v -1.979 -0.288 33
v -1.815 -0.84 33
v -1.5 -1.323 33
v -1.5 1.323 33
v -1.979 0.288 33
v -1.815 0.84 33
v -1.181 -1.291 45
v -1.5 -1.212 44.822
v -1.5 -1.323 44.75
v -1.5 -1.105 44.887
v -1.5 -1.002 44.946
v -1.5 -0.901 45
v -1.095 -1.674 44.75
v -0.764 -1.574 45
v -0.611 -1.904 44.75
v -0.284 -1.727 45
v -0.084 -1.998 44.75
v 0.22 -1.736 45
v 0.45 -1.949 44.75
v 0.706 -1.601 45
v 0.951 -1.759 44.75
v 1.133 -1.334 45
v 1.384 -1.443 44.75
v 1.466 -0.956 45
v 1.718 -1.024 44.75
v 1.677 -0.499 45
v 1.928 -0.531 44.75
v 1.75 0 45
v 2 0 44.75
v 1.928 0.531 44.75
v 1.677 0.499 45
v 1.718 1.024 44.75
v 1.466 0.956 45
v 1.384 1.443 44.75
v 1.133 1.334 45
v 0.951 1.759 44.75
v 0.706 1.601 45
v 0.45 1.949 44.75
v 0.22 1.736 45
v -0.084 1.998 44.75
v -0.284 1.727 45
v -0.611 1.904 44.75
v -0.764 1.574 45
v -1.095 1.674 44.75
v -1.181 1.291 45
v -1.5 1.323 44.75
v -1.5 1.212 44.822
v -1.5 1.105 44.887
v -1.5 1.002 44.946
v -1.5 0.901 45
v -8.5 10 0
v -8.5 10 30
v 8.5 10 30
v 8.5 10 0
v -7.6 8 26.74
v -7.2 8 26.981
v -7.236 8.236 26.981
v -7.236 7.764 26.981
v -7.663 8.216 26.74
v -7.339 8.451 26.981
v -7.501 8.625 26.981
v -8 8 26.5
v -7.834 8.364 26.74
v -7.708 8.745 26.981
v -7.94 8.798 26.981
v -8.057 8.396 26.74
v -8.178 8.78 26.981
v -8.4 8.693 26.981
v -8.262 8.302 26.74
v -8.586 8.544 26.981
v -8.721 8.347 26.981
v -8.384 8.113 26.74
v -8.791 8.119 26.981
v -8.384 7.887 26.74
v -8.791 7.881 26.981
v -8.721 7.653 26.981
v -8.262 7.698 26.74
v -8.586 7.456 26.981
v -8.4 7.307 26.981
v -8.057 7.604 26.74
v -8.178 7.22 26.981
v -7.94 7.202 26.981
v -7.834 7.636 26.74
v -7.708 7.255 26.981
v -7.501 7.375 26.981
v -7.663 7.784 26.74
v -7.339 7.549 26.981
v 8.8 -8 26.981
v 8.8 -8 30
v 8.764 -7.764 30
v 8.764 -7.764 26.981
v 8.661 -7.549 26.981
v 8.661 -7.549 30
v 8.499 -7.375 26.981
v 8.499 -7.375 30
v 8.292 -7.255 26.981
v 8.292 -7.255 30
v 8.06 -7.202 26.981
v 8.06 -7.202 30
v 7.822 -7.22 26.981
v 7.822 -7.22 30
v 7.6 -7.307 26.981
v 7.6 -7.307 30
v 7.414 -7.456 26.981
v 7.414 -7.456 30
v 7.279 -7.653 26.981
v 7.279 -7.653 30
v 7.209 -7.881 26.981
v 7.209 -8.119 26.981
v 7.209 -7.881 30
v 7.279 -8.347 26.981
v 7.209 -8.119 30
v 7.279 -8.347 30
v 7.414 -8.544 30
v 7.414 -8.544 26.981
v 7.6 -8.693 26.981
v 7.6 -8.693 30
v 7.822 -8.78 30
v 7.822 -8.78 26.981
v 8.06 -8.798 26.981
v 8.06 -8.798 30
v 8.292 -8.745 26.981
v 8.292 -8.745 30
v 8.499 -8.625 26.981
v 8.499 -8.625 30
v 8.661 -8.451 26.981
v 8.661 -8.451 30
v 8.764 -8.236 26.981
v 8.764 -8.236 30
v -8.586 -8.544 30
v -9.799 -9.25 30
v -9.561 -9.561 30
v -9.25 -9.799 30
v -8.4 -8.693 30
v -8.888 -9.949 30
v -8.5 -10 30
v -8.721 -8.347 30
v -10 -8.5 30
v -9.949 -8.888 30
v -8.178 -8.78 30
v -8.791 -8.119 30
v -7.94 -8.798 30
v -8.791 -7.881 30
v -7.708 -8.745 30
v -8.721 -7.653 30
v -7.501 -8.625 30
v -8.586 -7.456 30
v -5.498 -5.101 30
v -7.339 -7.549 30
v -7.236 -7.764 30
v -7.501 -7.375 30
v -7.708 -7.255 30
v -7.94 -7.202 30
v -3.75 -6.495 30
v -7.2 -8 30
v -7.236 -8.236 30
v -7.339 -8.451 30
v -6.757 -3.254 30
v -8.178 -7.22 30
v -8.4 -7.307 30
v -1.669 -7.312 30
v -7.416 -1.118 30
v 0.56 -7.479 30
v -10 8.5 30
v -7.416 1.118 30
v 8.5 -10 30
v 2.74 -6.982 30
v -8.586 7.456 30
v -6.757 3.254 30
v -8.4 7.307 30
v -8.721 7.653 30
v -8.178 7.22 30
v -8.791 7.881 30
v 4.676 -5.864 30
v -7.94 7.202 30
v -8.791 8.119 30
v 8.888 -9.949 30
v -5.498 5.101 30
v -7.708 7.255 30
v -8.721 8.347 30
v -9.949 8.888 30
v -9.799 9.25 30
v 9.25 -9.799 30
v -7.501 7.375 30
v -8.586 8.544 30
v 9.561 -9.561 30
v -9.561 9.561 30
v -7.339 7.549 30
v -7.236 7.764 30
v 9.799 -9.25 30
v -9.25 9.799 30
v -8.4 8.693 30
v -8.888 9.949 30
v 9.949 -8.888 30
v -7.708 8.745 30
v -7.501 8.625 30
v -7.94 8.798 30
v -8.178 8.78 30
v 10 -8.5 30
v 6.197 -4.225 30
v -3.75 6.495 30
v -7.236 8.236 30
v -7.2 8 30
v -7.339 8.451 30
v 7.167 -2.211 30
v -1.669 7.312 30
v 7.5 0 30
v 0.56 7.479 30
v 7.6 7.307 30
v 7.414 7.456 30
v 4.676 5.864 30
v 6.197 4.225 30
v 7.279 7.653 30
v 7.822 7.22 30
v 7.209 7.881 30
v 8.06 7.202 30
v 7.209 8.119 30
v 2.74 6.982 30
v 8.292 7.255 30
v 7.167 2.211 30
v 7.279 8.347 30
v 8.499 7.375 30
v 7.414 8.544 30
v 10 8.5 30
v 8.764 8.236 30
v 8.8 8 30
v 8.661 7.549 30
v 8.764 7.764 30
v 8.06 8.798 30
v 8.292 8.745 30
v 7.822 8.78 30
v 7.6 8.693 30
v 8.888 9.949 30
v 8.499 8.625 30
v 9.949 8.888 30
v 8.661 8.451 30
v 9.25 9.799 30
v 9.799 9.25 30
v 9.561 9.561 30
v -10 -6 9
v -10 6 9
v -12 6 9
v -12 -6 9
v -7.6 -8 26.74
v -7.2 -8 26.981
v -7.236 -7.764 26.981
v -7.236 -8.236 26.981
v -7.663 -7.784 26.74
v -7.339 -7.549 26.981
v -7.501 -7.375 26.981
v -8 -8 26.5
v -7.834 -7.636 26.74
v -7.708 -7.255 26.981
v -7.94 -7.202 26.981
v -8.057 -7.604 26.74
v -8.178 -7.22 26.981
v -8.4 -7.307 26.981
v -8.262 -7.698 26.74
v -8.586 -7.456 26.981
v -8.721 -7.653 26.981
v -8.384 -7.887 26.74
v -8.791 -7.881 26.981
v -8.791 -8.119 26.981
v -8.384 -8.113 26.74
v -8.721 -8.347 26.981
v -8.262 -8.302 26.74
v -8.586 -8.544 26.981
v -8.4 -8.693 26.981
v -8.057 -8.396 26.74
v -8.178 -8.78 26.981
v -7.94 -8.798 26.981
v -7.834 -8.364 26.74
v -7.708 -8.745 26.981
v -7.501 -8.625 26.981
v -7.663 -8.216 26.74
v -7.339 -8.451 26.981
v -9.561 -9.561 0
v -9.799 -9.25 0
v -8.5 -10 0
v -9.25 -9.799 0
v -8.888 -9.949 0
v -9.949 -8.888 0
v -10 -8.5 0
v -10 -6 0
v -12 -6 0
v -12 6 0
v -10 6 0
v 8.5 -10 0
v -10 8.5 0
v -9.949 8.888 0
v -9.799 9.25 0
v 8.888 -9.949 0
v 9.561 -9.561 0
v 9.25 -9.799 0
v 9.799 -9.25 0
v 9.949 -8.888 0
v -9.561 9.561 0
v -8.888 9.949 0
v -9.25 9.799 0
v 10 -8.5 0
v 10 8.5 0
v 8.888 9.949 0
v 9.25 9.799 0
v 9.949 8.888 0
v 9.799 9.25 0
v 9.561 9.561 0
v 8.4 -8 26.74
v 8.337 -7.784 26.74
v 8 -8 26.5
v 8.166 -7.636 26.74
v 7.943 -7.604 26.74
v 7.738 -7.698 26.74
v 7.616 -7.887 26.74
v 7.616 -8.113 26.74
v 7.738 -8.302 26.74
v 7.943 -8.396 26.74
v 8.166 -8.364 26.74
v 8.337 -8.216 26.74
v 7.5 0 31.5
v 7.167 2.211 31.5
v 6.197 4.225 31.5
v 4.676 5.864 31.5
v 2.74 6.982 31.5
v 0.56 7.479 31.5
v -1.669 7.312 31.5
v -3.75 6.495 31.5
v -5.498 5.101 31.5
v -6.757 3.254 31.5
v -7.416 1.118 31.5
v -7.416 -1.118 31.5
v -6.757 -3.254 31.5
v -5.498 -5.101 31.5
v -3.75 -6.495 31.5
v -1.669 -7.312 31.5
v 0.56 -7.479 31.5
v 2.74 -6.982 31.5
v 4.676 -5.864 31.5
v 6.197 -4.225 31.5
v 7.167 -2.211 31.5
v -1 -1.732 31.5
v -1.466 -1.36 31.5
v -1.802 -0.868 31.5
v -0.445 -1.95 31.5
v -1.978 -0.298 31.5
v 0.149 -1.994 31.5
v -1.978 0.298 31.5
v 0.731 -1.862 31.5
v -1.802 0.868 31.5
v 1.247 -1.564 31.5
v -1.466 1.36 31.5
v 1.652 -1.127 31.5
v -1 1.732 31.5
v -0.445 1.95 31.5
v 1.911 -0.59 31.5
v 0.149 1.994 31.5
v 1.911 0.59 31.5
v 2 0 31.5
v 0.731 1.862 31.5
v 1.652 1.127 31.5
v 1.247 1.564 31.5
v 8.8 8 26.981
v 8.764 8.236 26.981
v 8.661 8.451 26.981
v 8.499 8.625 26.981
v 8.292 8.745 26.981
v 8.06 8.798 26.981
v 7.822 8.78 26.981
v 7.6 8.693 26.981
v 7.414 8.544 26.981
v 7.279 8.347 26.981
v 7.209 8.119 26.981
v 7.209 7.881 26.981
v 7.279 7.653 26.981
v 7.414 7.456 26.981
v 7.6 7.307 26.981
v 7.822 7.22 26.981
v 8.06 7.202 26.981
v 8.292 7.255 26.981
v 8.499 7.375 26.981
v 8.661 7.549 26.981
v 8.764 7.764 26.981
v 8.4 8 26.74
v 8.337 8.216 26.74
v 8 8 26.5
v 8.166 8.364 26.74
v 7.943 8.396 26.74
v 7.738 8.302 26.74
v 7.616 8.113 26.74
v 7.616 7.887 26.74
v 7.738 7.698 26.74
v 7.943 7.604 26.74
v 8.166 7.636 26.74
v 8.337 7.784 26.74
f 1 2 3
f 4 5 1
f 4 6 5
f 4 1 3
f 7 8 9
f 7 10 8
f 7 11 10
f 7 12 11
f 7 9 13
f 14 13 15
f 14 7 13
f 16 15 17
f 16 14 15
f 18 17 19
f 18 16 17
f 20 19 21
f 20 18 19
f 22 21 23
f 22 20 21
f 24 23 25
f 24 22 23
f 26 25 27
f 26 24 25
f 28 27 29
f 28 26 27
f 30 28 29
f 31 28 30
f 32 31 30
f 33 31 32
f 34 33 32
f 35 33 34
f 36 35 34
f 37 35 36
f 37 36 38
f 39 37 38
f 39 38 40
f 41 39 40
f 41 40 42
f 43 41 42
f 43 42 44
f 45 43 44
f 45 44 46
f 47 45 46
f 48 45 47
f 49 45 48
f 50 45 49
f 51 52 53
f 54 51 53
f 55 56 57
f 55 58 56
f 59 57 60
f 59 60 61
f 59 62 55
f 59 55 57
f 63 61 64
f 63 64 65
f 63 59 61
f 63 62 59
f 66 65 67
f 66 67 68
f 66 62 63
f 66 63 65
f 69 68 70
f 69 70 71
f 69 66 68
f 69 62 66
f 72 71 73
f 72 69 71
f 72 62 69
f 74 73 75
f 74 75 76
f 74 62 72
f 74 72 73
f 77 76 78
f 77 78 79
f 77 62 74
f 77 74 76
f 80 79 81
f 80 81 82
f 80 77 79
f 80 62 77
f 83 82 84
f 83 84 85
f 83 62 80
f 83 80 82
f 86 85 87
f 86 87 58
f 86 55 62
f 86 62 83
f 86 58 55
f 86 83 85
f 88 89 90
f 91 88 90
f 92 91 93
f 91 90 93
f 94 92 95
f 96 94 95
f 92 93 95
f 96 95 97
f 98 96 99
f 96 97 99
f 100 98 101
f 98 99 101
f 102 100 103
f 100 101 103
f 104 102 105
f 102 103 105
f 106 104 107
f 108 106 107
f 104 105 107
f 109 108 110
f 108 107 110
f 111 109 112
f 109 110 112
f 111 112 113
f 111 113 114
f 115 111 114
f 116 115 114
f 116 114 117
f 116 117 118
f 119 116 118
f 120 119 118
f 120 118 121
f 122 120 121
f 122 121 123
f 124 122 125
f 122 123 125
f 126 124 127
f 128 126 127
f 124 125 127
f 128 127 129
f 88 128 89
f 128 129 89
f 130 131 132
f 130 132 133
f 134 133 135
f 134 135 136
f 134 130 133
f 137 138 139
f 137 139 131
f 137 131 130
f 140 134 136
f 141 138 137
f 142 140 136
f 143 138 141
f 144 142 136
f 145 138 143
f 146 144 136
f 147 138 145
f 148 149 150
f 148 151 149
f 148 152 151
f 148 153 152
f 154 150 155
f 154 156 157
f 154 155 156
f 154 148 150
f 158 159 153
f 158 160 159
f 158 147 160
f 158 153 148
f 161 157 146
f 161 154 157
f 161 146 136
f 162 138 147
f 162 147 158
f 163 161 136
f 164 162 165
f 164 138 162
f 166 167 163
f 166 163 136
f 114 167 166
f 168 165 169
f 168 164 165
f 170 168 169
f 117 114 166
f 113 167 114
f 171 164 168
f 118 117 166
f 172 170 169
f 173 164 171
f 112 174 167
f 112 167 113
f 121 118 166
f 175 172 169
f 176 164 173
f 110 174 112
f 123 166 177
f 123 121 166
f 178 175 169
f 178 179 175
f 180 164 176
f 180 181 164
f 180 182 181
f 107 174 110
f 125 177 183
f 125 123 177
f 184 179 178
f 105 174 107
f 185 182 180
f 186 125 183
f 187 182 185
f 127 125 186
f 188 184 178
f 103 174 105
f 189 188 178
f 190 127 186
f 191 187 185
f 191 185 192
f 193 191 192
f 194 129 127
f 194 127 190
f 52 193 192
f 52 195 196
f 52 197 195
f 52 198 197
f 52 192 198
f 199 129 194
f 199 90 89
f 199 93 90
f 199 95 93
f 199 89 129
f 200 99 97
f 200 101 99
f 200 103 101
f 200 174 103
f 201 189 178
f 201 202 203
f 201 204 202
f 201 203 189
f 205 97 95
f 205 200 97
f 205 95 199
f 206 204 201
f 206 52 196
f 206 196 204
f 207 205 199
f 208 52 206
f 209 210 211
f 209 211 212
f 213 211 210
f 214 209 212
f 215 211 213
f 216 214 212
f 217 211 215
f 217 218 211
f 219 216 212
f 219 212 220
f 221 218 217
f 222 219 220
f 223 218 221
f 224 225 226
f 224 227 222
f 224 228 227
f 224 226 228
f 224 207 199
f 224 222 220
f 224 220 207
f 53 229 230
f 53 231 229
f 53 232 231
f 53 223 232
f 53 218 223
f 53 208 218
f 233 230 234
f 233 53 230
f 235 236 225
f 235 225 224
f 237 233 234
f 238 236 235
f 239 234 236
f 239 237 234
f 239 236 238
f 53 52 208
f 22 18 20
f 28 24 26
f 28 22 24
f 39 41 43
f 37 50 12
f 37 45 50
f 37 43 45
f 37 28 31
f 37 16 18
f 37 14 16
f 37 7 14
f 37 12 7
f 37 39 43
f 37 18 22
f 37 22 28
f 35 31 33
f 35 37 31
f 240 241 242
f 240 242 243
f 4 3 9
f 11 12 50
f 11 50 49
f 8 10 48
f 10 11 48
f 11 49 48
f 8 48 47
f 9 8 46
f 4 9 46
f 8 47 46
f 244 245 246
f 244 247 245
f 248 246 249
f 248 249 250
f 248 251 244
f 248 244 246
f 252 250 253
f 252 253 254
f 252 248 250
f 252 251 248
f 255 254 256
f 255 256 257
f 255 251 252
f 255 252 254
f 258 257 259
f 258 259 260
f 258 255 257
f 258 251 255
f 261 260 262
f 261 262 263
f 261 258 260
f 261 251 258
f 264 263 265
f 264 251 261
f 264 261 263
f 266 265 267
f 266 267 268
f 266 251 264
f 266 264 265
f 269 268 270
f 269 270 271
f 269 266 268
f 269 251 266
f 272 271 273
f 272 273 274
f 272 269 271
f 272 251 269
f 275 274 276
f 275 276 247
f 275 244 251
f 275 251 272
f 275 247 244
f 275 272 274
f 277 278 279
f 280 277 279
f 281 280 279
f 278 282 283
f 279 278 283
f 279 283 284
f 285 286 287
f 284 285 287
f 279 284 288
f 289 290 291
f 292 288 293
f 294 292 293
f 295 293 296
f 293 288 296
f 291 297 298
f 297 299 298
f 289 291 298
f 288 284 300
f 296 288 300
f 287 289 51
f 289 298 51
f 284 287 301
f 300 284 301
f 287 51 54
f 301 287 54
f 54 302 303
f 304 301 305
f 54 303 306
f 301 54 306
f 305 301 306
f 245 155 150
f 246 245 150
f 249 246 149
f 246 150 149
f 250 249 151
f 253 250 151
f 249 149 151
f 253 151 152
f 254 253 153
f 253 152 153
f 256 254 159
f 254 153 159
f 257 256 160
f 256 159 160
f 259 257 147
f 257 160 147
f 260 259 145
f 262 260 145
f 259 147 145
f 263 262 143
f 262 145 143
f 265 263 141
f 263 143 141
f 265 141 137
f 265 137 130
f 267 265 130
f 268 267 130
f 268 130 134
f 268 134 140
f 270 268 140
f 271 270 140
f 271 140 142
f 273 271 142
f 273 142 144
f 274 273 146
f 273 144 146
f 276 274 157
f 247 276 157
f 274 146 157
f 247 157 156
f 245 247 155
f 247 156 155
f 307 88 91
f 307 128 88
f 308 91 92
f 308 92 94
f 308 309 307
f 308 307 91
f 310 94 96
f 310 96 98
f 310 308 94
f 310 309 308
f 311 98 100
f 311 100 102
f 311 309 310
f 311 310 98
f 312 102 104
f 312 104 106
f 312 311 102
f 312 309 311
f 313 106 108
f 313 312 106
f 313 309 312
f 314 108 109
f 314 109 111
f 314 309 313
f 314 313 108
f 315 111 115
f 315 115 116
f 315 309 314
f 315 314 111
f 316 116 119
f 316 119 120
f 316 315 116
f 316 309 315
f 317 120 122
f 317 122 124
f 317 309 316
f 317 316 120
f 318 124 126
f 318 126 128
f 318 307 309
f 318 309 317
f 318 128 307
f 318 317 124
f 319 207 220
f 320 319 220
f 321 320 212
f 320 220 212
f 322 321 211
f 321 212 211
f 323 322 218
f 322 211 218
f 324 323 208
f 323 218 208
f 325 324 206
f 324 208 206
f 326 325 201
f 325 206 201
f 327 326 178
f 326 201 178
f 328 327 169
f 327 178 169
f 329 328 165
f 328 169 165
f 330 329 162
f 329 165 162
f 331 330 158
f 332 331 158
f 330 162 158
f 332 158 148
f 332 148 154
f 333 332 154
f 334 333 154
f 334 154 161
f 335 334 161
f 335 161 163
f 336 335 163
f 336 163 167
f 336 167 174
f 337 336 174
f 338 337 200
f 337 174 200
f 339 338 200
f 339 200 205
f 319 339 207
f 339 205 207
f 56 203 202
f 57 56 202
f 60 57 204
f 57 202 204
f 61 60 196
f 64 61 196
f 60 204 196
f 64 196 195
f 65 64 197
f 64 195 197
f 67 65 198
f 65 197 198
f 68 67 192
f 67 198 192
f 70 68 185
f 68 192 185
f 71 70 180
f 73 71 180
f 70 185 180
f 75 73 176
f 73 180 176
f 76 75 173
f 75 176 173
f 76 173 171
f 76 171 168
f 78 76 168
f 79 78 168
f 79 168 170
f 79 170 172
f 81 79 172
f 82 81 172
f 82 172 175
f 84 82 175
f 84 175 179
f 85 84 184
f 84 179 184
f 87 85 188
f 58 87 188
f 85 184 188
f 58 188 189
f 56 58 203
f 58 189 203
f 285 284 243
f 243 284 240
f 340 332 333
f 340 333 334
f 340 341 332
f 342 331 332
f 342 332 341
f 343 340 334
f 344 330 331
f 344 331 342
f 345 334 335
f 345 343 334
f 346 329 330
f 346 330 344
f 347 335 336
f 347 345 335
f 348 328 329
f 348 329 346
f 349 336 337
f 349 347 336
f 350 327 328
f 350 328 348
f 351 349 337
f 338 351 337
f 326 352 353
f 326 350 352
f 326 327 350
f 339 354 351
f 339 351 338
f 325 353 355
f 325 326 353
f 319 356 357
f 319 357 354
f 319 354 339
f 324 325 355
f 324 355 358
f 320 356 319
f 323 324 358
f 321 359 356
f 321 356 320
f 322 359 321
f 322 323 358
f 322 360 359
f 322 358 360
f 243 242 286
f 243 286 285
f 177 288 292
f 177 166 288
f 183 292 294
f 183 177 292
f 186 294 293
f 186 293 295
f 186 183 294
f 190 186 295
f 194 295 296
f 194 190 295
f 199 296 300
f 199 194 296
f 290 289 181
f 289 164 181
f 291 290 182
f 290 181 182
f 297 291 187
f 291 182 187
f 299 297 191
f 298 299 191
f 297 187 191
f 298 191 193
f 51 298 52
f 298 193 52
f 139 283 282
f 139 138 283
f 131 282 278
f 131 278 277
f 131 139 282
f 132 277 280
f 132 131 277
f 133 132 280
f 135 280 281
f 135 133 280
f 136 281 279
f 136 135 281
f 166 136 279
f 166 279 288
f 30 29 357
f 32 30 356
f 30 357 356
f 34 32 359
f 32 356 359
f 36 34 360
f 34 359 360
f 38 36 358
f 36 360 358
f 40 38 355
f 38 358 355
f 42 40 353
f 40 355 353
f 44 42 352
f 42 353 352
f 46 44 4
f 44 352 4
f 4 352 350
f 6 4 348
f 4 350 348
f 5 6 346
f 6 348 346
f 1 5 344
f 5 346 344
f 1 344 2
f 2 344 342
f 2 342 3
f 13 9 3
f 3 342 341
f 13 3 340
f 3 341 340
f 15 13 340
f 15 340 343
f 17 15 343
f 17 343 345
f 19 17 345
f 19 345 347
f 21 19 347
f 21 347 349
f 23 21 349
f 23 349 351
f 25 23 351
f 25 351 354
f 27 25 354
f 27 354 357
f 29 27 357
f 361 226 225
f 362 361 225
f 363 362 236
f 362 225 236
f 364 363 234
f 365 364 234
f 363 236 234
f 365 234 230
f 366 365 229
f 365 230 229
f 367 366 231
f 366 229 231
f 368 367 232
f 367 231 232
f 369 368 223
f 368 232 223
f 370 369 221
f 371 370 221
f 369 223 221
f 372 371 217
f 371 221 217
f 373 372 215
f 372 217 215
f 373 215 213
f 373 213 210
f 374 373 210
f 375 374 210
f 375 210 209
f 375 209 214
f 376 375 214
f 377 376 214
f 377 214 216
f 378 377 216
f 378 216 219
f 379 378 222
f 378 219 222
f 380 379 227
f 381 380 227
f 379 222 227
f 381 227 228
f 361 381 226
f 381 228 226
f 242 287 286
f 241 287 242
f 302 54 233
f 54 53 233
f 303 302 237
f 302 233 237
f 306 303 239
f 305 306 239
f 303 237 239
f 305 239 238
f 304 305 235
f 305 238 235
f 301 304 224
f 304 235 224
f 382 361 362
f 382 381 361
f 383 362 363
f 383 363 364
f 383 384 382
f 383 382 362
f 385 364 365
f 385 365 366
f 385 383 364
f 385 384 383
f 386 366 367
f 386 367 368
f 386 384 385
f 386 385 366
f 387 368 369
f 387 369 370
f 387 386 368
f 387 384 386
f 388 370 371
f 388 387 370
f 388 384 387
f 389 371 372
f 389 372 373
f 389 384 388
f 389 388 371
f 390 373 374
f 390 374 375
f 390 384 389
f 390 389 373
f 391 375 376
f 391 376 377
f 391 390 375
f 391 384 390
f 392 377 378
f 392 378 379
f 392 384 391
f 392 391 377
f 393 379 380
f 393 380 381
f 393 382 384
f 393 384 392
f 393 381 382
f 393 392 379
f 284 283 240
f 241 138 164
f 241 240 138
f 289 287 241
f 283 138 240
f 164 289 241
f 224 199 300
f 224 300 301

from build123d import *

# Parameters (mm, degrees)
SKETCH004_W     = 20
SKETCH004_H     = 20
PAD003_DEPTH    = 30
SKETCH005_R     = 7.5
PAD004_DEPTH    = 1.5
FILLET_R        = 1.5
SKETCH006_R     = 0.8
HOLE_DEPTH      = 3.019312
HOLE_TIPS_R     = 0.8
SKETCH007_R     = 2
PAD005_DEPTH    = 13.5
SKETCH008_W     = 5
SKETCH008_H     = 10
POCKET001_DEPTH = 12
CHAMFER001_SIZE = 0.25
SKETCH009_W     = 12
SKETCH009_H     = 9
PAD006_DEPTH    = 2


with BuildPart() as part:
    # Sketch004 → Pad003 (new body)
    with BuildSketch(Plane.XY):
        Rectangle(SKETCH004_W, SKETCH004_H)
    extrude(amount=PAD003_DEPTH)

    # Sketch005 (on Face6 of Pad003) → Pad004 (join)
    with BuildSketch(Plane.XY.offset(30)):
        Circle(SKETCH005_R)
    extrude(amount=PAD004_DEPTH)

    # Fillet
    fillet_edges = [part.edges().sort_by_distance(p)[0] for p in [
        (-10, -10, 15),
        (10, -10, 15),
        (10, 10, 15),
        (-10, 10, 15),
    ]]
    fillet(fillet_edges, radius=FILLET_R)

    # Sketch006 (on Face5 of Fillet) → Hole (cut)
    with BuildSketch(Plane.XY.offset(30)):
        with Locations((-8, 8)):
            Circle(SKETCH006_R)
        with Locations((8, 8)):
            Circle(SKETCH006_R)
        with Locations((8, -8)):
            Circle(SKETCH006_R)
        with Locations((-8, -8)):
            Circle(SKETCH006_R)
    extrude(amount=-HOLE_DEPTH, mode=Mode.SUBTRACT)

    # Hole tips → Hole tip 1 section 0
    with BuildSketch(Plane.XY.offset(26.980688), mode=Mode.PRIVATE) as hole_tip_1_s0:
        with Locations((-8, 8)):
            Circle(HOLE_TIPS_R)
    loft([hole_tip_1_s0.sketch, Vertex(-8, 8, 26.5)], mode=Mode.SUBTRACT)

    # Hole tips → Hole tip 2 section 0
    with BuildSketch(Plane.XY.offset(26.980688), mode=Mode.PRIVATE) as hole_tip_2_s0:
        with Locations((8, 8)):
            Circle(HOLE_TIPS_R)
    loft([hole_tip_2_s0.sketch, Vertex(8, 8, 26.5)], mode=Mode.SUBTRACT)

    # Hole tips → Hole tip 3 section 0
    with BuildSketch(Plane.XY.offset(26.980688), mode=Mode.PRIVATE) as hole_tip_3_s0:
        with Locations((8, -8)):
            Circle(HOLE_TIPS_R)
    loft([hole_tip_3_s0.sketch, Vertex(8, -8, 26.5)], mode=Mode.SUBTRACT)

    # Hole tips → Hole tip 4 section 0
    with BuildSketch(Plane.XY.offset(26.980688), mode=Mode.PRIVATE) as hole_tip_4_s0:
        with Locations((-8, -8)):
            Circle(HOLE_TIPS_R)
    loft([hole_tip_4_s0.sketch, Vertex(-8, -8, 26.5)], mode=Mode.SUBTRACT)

    # Sketch007 (on Face17 of Hole) → Pad005 (join)
    with BuildSketch(Plane.XY.offset(31.5)):
        Circle(SKETCH007_R)
    extrude(amount=PAD005_DEPTH)

    # Sketch008 (on Face22 of Pad005) → Pocket001 (cut)
    with BuildSketch(Plane.XY.offset(45)):
        with Locations((-4, 0)):
            Rectangle(SKETCH008_W, SKETCH008_H)
    extrude(amount=-POCKET001_DEPTH, mode=Mode.SUBTRACT)

    # Chamfer001
    chamfer001_edges = [part.edges().sort_by_distance(p)[0] for p in [
        (0.707107, -1.870829, 45),
        (0.707107, 1.870829, 45),
    ]]
    chamfer(chamfer001_edges, length=CHAMFER001_SIZE)

    # Sketch009 (on Face13 of Chamfer001) → Pad006 (join)
    with BuildSketch(Plane(origin=(-10, 0, 0), x_dir=(0, -1, 0), z_dir=(-1, 0, 0))):
        with Locations((0, 4.5)):
            Rectangle(SKETCH009_W, SKETCH009_H)
    extrude(amount=PAD006_DEPTH)


solid = part.part
